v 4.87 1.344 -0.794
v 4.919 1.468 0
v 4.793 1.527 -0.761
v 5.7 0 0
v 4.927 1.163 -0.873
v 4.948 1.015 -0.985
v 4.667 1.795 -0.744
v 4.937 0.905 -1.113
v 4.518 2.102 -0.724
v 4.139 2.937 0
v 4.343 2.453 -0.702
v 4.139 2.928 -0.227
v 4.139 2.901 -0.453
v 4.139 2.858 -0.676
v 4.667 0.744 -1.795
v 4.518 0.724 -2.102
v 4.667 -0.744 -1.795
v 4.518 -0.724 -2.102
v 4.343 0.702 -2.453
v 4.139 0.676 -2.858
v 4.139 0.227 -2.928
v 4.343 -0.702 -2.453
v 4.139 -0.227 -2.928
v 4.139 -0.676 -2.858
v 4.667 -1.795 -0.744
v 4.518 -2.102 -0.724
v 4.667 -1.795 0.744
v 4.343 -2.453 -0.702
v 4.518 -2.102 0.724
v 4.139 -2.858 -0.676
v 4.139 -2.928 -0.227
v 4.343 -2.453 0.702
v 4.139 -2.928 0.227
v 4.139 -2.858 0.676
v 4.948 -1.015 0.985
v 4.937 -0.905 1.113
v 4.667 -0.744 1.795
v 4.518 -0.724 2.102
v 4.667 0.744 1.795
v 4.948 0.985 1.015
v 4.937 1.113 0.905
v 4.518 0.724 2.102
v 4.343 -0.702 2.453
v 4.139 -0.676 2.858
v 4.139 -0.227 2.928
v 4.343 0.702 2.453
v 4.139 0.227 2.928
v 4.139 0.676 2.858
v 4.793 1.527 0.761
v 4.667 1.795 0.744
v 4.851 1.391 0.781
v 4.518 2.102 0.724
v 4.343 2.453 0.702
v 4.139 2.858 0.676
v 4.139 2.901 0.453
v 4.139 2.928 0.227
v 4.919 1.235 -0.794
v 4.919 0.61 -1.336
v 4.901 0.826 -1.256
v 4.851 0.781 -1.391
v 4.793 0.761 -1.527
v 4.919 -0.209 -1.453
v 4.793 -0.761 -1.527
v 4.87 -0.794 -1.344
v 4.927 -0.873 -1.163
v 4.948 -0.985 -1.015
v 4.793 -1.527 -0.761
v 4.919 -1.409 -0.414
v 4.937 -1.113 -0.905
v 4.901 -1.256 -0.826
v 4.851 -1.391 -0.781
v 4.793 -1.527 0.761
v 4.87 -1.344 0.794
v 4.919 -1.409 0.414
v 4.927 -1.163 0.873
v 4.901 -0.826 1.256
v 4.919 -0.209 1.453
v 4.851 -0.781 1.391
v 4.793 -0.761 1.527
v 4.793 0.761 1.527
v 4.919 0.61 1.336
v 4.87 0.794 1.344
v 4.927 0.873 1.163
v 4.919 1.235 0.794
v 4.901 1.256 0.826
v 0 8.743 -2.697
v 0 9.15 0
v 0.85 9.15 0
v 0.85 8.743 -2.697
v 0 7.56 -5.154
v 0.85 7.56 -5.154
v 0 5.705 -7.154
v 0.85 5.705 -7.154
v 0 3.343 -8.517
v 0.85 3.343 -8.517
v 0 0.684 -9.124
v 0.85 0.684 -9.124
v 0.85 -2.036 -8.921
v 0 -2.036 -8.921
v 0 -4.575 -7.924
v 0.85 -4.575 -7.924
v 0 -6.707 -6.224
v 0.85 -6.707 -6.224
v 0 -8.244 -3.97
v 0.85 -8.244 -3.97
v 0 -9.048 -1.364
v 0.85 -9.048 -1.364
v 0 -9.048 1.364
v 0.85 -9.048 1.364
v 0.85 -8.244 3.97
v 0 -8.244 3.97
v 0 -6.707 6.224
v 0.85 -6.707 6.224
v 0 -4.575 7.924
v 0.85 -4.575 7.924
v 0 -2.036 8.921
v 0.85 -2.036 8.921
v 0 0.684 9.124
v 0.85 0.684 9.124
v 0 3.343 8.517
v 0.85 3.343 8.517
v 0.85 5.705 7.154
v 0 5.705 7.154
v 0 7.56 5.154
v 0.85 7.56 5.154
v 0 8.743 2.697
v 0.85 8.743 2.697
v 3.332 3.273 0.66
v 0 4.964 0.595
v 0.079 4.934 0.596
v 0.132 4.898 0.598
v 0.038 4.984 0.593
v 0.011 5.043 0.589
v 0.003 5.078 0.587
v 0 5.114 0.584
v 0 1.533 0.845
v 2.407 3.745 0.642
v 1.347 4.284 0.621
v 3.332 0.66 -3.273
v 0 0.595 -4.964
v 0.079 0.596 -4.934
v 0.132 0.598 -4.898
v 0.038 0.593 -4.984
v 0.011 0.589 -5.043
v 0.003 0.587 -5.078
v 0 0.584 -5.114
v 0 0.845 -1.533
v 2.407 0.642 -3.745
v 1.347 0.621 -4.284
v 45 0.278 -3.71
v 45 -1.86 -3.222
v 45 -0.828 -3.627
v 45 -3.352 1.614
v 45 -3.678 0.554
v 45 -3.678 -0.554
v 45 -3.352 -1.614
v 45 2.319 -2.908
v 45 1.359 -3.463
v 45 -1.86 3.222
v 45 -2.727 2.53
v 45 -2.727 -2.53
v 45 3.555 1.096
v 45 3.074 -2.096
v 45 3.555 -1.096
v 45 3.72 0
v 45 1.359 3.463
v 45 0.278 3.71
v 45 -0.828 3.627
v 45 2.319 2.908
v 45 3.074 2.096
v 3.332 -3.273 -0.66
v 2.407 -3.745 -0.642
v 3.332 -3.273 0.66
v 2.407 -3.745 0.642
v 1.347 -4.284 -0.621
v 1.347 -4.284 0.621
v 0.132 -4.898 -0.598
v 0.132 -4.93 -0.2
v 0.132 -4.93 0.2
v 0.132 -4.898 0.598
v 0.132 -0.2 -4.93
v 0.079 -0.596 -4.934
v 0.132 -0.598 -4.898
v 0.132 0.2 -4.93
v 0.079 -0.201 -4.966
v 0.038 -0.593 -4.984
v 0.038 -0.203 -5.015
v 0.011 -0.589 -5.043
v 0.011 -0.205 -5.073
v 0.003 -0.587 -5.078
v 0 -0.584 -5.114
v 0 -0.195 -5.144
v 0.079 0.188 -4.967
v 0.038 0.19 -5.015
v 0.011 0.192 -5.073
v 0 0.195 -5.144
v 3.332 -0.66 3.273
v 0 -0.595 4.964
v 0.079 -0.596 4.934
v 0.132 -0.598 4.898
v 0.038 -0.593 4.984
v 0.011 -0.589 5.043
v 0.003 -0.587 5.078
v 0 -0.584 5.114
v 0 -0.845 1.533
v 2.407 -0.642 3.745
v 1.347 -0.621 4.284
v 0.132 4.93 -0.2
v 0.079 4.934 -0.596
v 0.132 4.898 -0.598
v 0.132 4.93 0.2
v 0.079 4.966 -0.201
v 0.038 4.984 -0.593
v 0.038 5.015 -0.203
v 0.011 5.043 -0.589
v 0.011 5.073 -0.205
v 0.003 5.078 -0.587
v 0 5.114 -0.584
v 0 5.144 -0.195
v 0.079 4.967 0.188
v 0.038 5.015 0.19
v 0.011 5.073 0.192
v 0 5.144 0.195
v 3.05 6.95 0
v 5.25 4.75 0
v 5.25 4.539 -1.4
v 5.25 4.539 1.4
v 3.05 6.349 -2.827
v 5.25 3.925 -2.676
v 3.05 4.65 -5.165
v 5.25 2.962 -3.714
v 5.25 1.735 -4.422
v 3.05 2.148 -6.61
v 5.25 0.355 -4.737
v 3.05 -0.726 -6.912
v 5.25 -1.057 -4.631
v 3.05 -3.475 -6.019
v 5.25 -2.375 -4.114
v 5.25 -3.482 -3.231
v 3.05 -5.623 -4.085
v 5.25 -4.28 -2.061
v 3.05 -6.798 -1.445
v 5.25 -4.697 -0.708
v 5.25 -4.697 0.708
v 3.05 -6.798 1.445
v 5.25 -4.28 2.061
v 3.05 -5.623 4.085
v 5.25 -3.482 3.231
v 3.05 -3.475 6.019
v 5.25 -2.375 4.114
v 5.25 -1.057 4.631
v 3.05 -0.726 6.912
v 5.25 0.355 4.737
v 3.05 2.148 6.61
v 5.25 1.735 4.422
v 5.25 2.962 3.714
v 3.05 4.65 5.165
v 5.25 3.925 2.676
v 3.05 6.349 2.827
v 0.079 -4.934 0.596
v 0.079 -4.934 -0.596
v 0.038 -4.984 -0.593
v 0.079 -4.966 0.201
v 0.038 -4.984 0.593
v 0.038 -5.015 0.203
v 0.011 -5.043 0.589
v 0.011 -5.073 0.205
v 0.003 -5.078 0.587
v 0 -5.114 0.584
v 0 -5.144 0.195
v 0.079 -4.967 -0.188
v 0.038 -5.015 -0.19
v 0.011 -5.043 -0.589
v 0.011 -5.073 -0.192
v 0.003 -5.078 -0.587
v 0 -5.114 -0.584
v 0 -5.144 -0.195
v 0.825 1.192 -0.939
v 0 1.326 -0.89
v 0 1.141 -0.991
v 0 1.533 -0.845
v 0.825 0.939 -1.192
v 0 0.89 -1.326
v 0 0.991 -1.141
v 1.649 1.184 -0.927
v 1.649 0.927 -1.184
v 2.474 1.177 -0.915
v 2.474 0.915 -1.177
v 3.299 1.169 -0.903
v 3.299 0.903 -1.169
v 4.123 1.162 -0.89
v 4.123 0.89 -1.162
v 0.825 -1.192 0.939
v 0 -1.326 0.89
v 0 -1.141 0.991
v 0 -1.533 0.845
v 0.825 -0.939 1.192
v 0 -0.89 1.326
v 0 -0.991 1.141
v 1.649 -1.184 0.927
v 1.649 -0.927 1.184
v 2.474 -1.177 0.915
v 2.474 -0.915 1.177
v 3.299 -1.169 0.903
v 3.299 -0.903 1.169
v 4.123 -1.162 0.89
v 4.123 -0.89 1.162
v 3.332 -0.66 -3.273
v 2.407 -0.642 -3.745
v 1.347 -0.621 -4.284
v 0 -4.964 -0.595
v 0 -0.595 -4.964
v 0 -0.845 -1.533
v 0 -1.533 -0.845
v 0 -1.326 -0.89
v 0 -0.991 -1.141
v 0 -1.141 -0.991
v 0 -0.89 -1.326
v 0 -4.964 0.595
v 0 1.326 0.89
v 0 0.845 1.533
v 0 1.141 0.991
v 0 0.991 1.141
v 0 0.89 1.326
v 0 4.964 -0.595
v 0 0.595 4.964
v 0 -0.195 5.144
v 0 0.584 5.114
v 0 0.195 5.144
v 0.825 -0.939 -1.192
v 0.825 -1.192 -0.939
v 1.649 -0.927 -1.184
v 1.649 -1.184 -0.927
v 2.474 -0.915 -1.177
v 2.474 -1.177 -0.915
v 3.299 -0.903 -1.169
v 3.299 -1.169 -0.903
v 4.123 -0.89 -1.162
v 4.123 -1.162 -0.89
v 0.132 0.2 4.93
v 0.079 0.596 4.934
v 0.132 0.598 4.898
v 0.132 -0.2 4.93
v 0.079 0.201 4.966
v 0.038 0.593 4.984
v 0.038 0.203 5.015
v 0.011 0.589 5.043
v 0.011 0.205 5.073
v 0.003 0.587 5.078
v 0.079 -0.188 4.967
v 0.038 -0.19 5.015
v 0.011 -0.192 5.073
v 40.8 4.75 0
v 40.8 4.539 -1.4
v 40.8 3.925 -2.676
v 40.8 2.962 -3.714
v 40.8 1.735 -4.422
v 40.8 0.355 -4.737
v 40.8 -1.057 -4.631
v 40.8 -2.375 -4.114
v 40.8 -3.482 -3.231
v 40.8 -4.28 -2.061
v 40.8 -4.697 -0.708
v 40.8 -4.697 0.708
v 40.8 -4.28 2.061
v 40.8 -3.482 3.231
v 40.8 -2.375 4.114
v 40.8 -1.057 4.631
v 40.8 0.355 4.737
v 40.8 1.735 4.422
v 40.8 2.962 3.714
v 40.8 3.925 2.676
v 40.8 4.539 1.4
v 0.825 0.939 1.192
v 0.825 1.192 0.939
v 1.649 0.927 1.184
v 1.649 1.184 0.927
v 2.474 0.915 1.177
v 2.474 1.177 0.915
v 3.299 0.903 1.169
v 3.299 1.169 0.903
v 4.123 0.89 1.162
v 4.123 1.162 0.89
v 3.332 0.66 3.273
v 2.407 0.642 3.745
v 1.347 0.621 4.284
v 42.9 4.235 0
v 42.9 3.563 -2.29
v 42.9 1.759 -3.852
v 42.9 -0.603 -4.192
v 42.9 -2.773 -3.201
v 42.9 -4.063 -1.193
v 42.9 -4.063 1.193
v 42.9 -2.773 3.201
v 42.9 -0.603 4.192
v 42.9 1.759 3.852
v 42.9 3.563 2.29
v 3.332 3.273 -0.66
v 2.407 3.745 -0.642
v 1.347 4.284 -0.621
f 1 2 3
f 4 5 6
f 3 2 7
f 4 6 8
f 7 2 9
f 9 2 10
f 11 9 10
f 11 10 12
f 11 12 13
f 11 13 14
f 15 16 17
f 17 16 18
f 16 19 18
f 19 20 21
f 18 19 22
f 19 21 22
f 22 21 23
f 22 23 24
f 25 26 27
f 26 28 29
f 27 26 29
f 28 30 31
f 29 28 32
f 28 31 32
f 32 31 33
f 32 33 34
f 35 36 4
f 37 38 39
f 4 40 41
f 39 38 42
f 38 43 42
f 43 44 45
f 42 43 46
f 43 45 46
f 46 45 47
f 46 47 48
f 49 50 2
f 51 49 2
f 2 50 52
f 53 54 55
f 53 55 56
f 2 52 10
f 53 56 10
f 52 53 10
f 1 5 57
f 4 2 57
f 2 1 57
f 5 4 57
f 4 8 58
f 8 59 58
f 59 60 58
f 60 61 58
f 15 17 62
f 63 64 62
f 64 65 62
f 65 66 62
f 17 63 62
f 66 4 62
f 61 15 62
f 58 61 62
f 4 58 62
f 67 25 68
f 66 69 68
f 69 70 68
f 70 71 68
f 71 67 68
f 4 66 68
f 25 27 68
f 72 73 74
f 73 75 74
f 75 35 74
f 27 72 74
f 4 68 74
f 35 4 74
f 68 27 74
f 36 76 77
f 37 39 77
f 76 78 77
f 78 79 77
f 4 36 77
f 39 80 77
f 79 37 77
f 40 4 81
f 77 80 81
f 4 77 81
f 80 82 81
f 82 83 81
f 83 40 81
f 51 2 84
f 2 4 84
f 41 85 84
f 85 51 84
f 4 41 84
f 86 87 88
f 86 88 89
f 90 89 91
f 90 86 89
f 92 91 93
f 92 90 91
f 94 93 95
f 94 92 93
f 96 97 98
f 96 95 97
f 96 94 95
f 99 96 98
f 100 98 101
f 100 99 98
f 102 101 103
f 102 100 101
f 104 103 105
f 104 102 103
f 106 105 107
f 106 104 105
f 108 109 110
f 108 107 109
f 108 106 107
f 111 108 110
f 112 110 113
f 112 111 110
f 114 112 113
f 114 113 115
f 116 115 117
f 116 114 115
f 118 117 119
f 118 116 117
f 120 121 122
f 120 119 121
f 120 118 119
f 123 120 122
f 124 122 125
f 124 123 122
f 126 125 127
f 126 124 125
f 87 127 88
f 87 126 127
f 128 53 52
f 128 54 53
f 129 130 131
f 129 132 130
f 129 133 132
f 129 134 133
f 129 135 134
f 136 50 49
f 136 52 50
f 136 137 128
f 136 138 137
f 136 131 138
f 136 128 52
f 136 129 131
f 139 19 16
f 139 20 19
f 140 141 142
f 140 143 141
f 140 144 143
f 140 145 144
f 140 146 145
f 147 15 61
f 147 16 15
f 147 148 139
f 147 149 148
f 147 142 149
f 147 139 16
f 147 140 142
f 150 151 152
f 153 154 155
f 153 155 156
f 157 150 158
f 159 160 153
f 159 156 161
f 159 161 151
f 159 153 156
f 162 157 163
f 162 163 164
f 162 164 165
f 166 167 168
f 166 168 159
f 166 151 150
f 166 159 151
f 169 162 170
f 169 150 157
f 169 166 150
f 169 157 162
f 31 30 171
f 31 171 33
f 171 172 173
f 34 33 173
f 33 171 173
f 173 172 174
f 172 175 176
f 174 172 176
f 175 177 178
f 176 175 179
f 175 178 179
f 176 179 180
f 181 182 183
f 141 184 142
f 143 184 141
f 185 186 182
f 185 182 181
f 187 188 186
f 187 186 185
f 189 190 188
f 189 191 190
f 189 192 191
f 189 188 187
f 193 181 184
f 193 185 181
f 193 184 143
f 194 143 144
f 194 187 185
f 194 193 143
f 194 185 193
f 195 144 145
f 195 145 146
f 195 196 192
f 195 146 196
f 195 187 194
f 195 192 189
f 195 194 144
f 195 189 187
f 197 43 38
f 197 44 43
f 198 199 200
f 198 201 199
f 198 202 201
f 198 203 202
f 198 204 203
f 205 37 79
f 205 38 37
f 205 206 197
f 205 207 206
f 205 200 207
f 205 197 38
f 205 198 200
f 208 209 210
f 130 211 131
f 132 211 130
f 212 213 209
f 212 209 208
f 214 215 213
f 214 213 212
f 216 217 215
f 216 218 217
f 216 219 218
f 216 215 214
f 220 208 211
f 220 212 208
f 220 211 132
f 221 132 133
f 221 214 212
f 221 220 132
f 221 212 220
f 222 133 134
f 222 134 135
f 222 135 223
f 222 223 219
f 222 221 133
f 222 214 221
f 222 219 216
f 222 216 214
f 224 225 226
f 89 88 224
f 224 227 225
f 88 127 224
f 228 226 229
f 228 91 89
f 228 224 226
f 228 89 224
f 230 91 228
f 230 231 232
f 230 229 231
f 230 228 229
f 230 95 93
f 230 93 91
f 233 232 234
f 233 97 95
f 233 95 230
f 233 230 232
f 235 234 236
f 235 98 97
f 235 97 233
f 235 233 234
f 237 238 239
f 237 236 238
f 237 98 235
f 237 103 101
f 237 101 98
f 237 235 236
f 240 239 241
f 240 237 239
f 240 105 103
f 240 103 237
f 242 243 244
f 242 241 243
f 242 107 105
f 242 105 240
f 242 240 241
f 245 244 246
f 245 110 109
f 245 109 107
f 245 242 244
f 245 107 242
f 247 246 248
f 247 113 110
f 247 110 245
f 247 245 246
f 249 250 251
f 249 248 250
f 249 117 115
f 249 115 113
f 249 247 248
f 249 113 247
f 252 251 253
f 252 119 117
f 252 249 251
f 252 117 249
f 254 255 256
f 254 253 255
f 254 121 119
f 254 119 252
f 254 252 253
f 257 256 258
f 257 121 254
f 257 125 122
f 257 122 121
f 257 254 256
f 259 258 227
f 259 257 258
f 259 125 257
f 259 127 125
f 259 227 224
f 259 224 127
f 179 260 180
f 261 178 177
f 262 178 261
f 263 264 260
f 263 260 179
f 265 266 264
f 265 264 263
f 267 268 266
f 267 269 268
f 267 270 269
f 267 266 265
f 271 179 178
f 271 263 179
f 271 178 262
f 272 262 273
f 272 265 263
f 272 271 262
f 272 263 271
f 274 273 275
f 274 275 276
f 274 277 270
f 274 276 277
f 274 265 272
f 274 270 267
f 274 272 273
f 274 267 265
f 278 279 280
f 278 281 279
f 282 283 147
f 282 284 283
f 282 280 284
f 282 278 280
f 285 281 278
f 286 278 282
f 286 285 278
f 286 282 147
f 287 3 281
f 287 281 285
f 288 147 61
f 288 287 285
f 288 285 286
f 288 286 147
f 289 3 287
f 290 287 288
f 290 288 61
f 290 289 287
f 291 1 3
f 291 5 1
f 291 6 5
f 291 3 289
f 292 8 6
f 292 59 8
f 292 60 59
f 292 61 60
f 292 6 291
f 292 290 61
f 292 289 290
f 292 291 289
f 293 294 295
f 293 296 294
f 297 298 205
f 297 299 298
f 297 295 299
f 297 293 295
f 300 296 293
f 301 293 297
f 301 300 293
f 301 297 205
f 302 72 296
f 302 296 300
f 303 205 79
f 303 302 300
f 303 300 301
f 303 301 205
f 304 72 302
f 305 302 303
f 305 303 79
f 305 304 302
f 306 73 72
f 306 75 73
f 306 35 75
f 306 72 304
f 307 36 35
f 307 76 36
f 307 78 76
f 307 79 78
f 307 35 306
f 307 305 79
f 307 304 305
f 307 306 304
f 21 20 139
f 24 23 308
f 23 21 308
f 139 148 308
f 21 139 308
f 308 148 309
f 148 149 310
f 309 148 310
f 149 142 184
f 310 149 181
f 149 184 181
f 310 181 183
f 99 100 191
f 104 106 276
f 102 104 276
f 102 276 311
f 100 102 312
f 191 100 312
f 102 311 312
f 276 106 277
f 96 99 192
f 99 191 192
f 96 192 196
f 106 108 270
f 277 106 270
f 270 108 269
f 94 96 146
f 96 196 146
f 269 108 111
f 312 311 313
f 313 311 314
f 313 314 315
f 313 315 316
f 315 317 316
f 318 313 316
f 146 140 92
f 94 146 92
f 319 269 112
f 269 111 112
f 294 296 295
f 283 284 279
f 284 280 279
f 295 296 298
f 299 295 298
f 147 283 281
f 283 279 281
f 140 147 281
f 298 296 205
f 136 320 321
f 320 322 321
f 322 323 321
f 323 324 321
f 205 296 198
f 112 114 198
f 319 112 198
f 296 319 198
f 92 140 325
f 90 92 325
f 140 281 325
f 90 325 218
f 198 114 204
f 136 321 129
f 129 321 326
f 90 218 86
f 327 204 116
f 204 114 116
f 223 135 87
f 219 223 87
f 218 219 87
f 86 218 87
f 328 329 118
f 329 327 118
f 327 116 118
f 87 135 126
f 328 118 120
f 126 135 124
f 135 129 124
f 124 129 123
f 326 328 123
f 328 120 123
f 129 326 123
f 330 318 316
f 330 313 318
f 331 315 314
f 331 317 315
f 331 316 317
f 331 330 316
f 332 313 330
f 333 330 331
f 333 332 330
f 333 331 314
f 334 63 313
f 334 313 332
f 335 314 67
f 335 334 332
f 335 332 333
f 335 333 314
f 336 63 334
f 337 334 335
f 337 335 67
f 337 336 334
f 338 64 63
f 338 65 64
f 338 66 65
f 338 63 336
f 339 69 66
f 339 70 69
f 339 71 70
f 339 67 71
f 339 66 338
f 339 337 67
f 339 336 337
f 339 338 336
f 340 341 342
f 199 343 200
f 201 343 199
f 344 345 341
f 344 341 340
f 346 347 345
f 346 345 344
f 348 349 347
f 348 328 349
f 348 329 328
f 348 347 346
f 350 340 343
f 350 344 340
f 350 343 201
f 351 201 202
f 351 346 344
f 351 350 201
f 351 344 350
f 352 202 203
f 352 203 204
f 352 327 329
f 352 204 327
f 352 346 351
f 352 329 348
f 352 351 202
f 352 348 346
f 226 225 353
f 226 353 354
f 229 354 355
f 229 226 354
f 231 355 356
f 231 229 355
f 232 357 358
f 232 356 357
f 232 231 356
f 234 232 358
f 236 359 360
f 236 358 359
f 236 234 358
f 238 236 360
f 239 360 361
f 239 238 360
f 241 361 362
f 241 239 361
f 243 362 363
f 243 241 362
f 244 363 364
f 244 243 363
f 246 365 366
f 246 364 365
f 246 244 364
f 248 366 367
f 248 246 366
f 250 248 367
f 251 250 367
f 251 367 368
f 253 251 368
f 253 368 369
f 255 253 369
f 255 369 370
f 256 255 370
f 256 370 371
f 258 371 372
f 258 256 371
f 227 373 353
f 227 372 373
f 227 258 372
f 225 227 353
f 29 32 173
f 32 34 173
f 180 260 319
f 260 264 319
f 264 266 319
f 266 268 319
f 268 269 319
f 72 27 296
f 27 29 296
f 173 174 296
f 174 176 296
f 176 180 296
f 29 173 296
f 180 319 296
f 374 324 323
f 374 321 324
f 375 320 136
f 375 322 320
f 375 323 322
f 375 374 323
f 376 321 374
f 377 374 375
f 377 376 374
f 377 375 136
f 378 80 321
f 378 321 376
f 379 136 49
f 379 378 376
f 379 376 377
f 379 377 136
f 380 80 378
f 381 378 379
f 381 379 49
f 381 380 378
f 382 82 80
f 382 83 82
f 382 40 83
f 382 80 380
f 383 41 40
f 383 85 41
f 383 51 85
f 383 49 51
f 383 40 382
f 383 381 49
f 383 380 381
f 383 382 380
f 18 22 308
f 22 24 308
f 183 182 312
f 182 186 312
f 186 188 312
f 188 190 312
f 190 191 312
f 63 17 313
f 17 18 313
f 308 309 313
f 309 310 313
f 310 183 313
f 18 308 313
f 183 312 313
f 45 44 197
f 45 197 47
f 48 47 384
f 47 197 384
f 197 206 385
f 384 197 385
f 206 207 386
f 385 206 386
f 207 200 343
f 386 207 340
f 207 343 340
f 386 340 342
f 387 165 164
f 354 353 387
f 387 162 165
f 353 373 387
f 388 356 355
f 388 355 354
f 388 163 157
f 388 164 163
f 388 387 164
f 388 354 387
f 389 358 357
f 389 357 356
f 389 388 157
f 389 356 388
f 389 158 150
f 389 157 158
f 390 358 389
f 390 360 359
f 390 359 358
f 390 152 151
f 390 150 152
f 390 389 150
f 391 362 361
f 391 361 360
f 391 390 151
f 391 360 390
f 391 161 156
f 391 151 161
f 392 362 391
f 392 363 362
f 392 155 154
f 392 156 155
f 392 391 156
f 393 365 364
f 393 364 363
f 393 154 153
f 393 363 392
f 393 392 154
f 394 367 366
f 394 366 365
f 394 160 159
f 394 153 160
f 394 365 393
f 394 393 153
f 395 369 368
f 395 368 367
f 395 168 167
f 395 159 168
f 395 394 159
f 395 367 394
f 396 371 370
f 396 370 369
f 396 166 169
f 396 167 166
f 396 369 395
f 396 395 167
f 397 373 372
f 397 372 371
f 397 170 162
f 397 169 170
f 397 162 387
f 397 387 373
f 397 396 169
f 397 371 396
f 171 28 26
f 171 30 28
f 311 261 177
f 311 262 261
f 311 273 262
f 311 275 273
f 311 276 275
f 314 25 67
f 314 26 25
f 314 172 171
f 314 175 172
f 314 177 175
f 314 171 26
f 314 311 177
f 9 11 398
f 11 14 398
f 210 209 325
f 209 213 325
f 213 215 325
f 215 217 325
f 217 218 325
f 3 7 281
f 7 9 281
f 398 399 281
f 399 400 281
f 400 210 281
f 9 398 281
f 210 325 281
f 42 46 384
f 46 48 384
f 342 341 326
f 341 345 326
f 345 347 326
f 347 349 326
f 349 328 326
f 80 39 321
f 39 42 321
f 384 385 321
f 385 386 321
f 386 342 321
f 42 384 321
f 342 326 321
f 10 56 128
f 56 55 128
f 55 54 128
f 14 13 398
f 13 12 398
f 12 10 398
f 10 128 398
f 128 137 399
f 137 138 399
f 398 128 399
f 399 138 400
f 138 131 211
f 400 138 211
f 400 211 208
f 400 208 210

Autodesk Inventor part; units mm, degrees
ref_plane "YZ Plane" through (0, 0, 0) normal (1, 0, 0) x (0, 1, 0)
ref_plane "XZ Plane" through (0, 0, 0) normal (0, 1, 0) x (-1, 0, 0)
sketch "Sketch1" plane through (0, 0, 0) normal (0, 0, 1) x (1, 0, 0)
  line L0 (5.7, 0) -> (45, 0)
  line L1 (45, 0) -> (45, 4.75)
  line L2 (45, 4.75) -> (5.25, 4.75)
  line L3 (0.85, 9.15) -> (0, 9.15)
  line L4 (-9, 0) -> (54, 0) projected
  line L5 (0, -1.83) -> (0, 10.98) projected
  line L6 (0, 5) -> (4.1386, 2.9366)
  line L7 (4.1386, 2.9366) -> (5.7, 0)
  line L8 (5.25, 4.75) -> (0.85, 9.15)
  line L9 (0, 9.15) -> (0, 5)
  dimension "d2" = 9.5
  dimension "d3" = 18.3
  dimension "d4" = 5.7
  dimension "d5" = 10
  dimension "d6" = 26.5
  dimension "d7" = 62
  dimension "d13" = 45
  dimension "d14" = 5.25
  dimension "d15" = 45
revolve "Body" add sketch "Sketch1" angle 360 about axis through (5.7, 0, 0) along (1, 0, 0) contours L7 L6 L5 L3 L8 L2 L1 L0
sketch "Sketch2" plane through (0, 0, 0) normal (-1, 0, 0) x (0, 0, 1)
  line L0 (0, -12.81) -> (0, 12.81) projected
  line L1 (-12.81, 0) -> (12.81, 0) projected
  line L2 (0, 5) -> (0, 0) construction
  line L3 (0, 0) -> (5, 0) construction
  arc A0 (1.5, 0) -> (0, 1.5) centre (0, 0) ccw construction
  line L4 (0, 0) -> (6.47, 6.47) construction
  arc A1 (1.75, 0) -> (0, 1.75) centre (0, 0) ccw construction
  line L5 (0.595, 4.9645) -> (0.8448, 1.5326)
  line L6 (4.9645, 0.595) -> (1.5326, 0.8448)
  arc A2 (0.8448, 1.5326) -> (1.5326, 0.8448) centre (1.5866, 1.5866) ccw
  arc A3 (5, 0) -> (4.9645, 0.595) centre (0, 0) ccw
  arc A4 (0.595, 4.9645) -> (0, 5) centre (0, 0) ccw
  arc A5 (4.9645, 0.595) -> (0.595, 4.9645) centre (0, 0) ccw
  line L7 (0.595, -4.9645) -> (0.8448, -1.5326)
  line L8 (4.9645, -0.595) -> (1.5326, -0.8448)
  arc A6 (1.5326, -0.8448) -> (0.8448, -1.5326) centre (1.5866, -1.5866) ccw
  arc A7 (4.9645, -0.595) -> (5, 0) centre (0, 0) ccw
  arc A8 (0, -5) -> (0.595, -4.9645) centre (0, 0) ccw
  arc A9 (0.595, -4.9645) -> (4.9645, -0.595) centre (0, 0) ccw
  line L9 (-0.595, 4.9645) -> (-0.8448, 1.5326)
  line L10 (-4.9645, 0.595) -> (-1.5326, 0.8448)
  arc A10 (-1.5326, 0.8448) -> (-0.8448, 1.5326) centre (-1.5866, 1.5866) ccw
  arc A11 (-4.9645, 0.595) -> (-5, 0) centre (0, 0) ccw
  arc A12 (0, 5) -> (-0.595, 4.9645) centre (0, 0) ccw
  arc A13 (-0.595, 4.9645) -> (-4.9645, 0.595) centre (0, 0) ccw
  arc A14 (-4.9645, -0.595) -> (-0.595, -4.9645) centre (0, 0) ccw
  arc A15 (-0.595, -4.9645) -> (0, -5) centre (0, 0) ccw
  arc A16 (-5, 0) -> (-4.9645, -0.595) centre (0, 0) ccw
  line L11 (-4.9645, -0.595) -> (-1.5326, -0.8448)
  arc A17 (-0.8448, -1.5326) -> (-1.5326, -0.8448) centre (-1.5866, -1.5866) ccw
  line L12 (-0.595, -4.9645) -> (-0.8448, -1.5326)
  circle A18 centre (0, 0) radius 9.15 projected
  circle A19 centre (0, 0) radius 5 projected
  dimension "d18" = 45
  dimension "d19" = 3
  dimension "d20" = 3.5
  dimension "d21" = 10
  dimension "d22" = 0.595
extrude "Slot" add sketch "Sketch2" against normal up to next draft 1 contours L7 A6 L8 A9 | A14 L11 A17 L12 | A13 L9 A10 L10 | L6 A2 L5 A5
fillet "Fillet1" radius 0.238 4 edges at (0, 5, 0) (0, 0, 5) (0, -5, 0) (0, 0, -5)
thread "Thread" size "9.5x2.1" class "6g" standard "Metric Forming Screw Threads" length 39.75
chamfer "Chamfer1" distance 1.03 distance2 4.2 1 edges at (45, -4.75, 0) measured on face at (45, -1.1851, 1.0499)
ref_plane "Work Plane2" through (2.8, 0, 0) normal (0, 1, 0) x (1, 0, 0)
equation "\"d2\" = NND"
equation "\"d3\" = KOD"
equation "\"d4\" = STI"
equation "\"d5\" = SDM"
equation "\"d13\" = 0.5 * SEWI"
equation "\"d14\" = KOH"
equation "\"d15\" = NLG"
equation "\"d19\" = 0.3 * SDM"
equation "\"d20\" = 0.35 * SDM"
equation "\"d21\" = SDM"
equation "\"d22\" = 0.5 * SBR"
equation "\"d45\" = STI"
equation "\"d25\" = 0.2 * SBR"
equation "\"d9\" = GEL"
equation "\"d11\" = -0.5 * GD2 + 0.5 * NND"
equation "\"d12\" = SPTZ"
equation "\"NND\" = 9.5"
equation "\"NLG\" = 45"
equation "\"GEL\" = 39.75"
equation "\"KOD\" = 18.3"
equation "\"KOH\" = 5.25"
equation "\"SDM\" = 10"
equation "\"STI\" = 5.7"
equation "\"SBR\" = 1.19"
equation "\"SPTZ\" = 4.2"
equation "\"GD2\" = 7.44"
equation "\"SEWI\" = 90deg"
equation "\"d0\" = NLG"
equation "\"d1\" = KOH"
equation "\"THREADDIA\" = 9.5"
equation "\"TOA\" = 30deg"
equation "\"PTC\" = 2.1"
equation "\"GD1\" = 7.85"
properties part number "ISO 7050 - ST 9.5 x 45 - F - H" material "Steel"
